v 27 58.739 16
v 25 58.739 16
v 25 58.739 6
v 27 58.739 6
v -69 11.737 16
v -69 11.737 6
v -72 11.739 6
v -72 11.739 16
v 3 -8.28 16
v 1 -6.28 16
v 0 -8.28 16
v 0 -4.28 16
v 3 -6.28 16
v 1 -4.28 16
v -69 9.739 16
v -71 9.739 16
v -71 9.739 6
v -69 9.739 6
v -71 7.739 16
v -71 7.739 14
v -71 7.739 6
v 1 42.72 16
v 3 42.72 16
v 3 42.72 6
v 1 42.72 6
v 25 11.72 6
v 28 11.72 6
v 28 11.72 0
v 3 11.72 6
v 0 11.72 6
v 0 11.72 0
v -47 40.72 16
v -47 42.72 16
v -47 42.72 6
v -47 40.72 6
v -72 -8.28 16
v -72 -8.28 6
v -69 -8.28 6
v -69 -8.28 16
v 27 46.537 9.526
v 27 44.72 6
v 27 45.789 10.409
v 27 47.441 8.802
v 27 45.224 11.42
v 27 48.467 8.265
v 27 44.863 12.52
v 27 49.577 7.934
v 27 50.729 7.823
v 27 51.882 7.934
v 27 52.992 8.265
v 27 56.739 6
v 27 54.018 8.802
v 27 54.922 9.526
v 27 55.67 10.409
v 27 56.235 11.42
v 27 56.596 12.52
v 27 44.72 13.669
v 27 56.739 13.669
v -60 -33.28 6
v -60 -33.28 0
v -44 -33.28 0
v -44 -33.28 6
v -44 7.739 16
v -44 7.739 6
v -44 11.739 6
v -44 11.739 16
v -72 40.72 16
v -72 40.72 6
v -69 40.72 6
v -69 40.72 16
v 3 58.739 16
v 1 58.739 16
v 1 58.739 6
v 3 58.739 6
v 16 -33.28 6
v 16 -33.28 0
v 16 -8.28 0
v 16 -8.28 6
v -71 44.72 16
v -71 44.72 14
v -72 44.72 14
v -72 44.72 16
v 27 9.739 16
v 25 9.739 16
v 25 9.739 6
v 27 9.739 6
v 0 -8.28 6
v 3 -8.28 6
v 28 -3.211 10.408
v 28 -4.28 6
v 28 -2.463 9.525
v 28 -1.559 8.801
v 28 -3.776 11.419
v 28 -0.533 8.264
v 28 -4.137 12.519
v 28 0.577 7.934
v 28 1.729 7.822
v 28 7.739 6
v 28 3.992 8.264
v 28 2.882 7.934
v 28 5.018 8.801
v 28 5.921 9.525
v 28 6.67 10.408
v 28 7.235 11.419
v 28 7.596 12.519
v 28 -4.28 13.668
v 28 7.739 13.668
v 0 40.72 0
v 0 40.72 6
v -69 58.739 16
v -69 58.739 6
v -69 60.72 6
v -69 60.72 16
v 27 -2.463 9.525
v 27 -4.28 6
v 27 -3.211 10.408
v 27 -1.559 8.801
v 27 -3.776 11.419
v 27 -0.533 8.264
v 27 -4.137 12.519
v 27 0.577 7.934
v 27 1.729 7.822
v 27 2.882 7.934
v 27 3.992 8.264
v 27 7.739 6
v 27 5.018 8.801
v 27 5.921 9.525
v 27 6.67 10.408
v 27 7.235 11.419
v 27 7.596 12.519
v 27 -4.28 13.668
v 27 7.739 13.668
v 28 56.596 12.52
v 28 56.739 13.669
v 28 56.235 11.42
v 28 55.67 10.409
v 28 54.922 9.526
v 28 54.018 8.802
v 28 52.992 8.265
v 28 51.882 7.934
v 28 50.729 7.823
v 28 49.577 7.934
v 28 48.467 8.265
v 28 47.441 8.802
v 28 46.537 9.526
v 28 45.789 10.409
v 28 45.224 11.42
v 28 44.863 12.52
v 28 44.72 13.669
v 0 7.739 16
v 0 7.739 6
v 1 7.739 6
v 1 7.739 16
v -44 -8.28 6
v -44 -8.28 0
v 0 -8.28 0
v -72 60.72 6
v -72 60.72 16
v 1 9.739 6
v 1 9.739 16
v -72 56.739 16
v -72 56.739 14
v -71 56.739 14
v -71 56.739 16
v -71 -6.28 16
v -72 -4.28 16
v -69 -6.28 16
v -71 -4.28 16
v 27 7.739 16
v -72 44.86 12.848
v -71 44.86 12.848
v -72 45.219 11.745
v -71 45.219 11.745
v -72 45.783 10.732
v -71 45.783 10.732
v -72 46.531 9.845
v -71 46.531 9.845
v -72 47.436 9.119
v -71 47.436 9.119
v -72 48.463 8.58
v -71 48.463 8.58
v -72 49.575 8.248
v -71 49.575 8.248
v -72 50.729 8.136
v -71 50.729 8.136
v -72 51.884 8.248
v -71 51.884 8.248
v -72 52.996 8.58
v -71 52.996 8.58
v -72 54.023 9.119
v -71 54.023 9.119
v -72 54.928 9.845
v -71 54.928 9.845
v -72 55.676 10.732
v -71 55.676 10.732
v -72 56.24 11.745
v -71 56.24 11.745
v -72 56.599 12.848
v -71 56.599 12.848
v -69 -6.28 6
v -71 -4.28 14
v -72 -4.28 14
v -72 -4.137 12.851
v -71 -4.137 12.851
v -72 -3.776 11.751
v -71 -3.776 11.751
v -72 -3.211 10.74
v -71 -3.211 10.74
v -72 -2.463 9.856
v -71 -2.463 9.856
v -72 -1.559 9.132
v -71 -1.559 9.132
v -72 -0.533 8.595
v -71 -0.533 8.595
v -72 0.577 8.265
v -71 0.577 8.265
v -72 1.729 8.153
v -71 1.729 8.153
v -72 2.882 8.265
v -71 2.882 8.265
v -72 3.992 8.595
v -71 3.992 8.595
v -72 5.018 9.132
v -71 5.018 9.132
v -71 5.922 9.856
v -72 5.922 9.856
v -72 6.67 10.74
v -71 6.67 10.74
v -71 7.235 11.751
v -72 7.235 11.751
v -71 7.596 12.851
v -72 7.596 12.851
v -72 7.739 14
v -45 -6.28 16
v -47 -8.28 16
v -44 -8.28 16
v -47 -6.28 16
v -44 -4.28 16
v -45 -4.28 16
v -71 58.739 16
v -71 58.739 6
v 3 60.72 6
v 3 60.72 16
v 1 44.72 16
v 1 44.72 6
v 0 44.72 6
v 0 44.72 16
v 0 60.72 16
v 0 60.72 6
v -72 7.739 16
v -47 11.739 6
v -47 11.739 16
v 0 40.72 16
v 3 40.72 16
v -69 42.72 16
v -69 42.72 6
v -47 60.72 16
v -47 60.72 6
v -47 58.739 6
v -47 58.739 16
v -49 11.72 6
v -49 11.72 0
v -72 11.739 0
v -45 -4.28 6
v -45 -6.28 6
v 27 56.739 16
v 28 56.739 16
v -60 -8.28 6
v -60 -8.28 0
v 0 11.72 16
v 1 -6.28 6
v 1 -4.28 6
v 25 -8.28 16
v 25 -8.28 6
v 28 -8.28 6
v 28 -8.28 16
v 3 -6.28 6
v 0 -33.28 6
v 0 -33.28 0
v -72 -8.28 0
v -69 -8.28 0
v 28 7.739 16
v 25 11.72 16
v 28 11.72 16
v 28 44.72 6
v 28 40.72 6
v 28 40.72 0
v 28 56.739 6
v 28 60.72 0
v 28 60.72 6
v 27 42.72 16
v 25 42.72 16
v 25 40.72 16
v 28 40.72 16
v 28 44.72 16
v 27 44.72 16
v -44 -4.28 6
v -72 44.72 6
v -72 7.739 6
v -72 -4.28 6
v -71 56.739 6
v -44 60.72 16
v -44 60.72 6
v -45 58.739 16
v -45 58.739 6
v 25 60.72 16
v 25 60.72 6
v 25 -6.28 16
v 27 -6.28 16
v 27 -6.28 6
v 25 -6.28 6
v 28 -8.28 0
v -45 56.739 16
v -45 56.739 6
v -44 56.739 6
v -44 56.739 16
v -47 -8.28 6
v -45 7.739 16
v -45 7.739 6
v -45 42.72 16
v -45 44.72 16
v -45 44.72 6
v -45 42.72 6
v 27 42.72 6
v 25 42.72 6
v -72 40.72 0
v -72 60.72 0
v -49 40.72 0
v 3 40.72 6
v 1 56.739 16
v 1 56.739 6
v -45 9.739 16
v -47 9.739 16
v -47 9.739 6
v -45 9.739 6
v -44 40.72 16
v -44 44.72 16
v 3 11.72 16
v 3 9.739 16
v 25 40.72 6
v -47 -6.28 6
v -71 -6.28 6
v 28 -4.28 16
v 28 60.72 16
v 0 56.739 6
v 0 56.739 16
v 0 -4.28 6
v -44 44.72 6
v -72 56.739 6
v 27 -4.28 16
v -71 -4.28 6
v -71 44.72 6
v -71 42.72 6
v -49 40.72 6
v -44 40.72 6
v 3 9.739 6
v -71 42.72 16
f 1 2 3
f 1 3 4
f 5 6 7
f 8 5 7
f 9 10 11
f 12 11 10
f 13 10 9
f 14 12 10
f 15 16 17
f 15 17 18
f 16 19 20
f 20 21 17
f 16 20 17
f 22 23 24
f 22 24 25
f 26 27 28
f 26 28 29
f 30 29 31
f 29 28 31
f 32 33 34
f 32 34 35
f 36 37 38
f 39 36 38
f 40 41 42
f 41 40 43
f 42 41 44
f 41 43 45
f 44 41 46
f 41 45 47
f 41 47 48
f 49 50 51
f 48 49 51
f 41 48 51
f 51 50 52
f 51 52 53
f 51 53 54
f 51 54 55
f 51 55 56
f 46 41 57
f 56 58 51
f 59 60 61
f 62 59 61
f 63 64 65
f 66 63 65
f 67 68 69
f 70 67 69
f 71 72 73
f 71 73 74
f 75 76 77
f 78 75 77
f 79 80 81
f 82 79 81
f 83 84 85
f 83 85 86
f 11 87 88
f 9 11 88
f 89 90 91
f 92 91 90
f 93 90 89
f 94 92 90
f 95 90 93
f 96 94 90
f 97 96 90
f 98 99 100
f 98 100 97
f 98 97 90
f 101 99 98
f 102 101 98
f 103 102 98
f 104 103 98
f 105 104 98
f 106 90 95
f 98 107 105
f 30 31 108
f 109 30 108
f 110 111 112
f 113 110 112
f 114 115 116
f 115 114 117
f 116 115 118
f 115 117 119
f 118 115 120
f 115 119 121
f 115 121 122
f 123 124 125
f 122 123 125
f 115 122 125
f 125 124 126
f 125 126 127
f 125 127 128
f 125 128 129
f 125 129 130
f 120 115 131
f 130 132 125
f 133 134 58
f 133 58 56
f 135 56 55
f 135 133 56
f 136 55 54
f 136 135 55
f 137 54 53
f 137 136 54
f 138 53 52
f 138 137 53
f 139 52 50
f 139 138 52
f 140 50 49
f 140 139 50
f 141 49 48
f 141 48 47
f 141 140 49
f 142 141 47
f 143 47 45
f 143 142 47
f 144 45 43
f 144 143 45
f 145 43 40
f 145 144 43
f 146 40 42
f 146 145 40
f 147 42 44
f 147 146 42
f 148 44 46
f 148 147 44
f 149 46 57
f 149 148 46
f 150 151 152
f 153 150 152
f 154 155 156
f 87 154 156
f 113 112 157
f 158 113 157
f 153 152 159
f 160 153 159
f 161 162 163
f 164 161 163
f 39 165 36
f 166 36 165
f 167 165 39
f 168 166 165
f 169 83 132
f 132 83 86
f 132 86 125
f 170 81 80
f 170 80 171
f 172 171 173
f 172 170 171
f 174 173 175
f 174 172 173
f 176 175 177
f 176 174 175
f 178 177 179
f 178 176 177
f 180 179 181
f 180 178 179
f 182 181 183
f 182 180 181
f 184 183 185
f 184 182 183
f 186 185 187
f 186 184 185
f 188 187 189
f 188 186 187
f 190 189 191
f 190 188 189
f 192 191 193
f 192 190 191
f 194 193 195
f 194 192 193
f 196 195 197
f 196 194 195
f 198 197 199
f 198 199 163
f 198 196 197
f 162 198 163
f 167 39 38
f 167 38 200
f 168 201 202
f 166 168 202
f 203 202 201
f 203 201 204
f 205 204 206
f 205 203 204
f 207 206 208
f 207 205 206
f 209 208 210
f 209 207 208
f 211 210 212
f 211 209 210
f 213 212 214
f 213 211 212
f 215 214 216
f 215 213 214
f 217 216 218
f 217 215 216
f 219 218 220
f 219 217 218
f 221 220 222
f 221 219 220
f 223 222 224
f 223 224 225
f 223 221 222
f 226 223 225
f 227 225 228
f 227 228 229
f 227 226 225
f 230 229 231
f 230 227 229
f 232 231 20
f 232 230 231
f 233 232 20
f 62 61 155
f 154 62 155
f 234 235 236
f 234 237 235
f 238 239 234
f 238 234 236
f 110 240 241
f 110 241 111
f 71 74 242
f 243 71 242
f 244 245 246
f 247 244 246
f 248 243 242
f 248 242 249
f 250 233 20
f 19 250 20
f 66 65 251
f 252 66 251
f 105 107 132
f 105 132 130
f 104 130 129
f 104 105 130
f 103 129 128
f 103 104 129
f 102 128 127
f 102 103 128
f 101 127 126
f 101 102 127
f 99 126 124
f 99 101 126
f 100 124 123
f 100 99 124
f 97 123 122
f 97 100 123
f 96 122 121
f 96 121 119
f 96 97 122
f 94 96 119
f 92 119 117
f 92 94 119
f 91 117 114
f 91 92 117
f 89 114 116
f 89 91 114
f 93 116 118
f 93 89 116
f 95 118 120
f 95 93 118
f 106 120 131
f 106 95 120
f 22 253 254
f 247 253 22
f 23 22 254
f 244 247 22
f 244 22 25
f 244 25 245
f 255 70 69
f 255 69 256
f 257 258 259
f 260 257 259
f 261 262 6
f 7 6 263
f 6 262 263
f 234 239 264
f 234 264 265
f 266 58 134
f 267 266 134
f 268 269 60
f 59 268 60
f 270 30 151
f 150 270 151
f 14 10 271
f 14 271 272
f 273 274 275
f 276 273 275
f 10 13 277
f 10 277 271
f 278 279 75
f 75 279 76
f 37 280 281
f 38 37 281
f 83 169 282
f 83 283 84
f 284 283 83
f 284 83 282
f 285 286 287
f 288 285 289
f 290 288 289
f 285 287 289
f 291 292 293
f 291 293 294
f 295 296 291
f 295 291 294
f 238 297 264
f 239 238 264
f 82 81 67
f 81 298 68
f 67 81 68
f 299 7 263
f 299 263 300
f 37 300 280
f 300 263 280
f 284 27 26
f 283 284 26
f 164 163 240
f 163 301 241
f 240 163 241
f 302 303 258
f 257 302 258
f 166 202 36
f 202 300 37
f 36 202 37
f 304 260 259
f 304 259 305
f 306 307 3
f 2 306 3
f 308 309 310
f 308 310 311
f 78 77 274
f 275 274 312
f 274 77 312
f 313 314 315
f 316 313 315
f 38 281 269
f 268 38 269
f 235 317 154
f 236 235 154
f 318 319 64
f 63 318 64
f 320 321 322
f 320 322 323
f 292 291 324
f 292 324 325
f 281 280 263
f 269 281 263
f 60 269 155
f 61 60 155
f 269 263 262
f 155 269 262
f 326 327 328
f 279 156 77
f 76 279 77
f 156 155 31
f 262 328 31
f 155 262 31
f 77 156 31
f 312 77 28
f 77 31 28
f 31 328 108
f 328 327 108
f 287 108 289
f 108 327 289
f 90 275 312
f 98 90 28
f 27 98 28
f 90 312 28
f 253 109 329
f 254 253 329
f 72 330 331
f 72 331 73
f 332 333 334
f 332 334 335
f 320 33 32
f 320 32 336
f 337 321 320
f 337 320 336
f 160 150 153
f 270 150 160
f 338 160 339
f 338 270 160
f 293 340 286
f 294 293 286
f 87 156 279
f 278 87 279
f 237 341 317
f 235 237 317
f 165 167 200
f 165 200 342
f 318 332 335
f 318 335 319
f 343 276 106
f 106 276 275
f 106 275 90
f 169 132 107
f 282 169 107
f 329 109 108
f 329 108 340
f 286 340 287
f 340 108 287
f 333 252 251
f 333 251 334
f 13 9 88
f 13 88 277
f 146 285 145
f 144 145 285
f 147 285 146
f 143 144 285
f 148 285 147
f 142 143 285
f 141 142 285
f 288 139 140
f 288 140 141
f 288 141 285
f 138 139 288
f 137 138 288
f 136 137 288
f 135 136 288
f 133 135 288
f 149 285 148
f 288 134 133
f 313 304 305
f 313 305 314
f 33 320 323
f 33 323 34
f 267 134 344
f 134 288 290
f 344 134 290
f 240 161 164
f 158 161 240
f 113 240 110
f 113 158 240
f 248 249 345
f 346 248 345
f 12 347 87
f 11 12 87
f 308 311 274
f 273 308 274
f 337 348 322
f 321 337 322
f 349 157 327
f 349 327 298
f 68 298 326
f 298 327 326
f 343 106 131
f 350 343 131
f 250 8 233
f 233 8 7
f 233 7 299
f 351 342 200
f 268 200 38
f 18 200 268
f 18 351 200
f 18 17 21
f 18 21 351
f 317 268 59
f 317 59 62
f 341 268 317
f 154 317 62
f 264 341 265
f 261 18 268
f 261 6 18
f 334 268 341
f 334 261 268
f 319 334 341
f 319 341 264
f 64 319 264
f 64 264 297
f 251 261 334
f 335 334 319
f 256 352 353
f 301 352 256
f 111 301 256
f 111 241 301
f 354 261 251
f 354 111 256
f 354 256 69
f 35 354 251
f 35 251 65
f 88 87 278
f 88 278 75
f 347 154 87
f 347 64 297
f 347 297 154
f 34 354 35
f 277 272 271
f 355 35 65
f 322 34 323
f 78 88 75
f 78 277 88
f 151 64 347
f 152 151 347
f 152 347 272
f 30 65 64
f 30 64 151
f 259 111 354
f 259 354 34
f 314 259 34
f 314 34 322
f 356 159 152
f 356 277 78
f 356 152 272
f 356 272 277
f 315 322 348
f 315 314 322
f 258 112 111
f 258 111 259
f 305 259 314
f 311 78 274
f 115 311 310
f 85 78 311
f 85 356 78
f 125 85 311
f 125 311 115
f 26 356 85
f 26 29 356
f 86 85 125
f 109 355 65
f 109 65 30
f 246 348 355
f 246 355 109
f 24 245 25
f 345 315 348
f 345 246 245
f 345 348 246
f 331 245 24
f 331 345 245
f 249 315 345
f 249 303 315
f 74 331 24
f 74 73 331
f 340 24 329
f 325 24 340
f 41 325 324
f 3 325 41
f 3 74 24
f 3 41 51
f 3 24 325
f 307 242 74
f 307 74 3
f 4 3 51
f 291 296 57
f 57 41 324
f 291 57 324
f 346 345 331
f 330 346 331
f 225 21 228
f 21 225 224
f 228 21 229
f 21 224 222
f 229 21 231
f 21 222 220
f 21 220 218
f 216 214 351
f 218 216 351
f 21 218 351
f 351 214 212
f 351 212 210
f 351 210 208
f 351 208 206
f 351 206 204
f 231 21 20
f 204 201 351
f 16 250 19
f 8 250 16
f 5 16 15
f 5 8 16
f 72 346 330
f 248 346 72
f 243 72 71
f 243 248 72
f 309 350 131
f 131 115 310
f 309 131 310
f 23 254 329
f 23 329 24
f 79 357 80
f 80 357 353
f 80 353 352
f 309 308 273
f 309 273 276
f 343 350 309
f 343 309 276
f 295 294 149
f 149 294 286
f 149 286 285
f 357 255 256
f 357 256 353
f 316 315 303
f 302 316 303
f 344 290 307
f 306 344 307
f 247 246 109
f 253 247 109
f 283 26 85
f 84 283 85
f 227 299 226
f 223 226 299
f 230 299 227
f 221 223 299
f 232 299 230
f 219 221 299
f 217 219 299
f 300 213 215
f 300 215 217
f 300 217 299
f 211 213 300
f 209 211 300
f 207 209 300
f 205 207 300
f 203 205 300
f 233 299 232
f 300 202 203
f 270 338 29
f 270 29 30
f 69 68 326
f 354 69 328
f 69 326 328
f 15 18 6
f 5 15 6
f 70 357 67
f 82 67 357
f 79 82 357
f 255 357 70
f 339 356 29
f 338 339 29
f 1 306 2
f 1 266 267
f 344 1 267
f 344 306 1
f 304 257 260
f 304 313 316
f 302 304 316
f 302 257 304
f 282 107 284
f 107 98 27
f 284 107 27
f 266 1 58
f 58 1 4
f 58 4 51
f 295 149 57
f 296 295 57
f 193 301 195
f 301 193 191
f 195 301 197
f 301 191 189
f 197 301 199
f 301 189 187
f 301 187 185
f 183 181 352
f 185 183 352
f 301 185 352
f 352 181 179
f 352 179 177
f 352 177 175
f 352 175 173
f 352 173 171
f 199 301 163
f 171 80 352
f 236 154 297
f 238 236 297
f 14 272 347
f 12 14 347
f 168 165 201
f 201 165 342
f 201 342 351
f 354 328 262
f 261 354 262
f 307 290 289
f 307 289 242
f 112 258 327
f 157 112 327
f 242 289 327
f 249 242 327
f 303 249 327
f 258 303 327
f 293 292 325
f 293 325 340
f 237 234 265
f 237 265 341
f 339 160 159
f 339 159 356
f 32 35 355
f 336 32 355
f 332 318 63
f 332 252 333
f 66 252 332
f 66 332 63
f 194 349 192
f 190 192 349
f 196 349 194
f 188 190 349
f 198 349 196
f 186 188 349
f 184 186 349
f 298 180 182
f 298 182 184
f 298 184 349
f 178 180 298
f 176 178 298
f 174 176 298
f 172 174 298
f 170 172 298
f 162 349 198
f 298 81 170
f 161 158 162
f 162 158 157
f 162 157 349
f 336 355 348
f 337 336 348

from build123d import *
from build123d import SkipClean  # not in build123d's __all__

# Parameters (mm, degrees)
F1_DEPTH  = 6
F3_DEPTH  = 10
F5_DEPTH  = 1
F7_DEPTH  = 1
F9_DEPTH  = 1
F10_DEPTH = 1
F13_DEPTH = 1


# Not quite as in the source:
# - ends of sketch curves that miss each other by under 0.0002 mm in the source are joined


with BuildPart() as f1:
    # F0 (on Top) → F1 (new body)
    with BuildSketch(Plane.XY):
        Polygon((-60, -8.2803227458), (-60, -33.2803227458), (-44, -33.2803227458), (-44, -8.2803227458), (0, -8.2803227458), (0, -33.2803227458), (16, -33.2803227458), (16, -8.2803227458), (28, -8.2803227458), (28, 11.7196772542), (0, 11.7196772542), (0, 40.7196772542), (28, 40.7196772542), (28, 60.7196772542), (-72, 60.7196772542), (-72, 40.7196772542), (-49, 40.7196772542), (-49, 11.7196772542), (-72, 11.7391310632), (-72, 11.693589665), (-72, 7.693589665), (-72, -4.280322887), (-72, -8.280322887), (-69, -8.2803227458), align=None)
    extrude(amount=F1_DEPTH)

    # F2 (on face) → F3 (join)
    with BuildSketch(Plane.XY.offset(6)):
        Polygon((-72, 60.7196772542), (-72, 56.7391310632), (-71, 56.7391310632), (-71, 58.7391310632), (-69, 58.7391310632), (-69, 60.7196772542), align=None)
        Polygon((-72, 40.7196773953), (-69, 40.7196773953), (-69, 42.7196773953), (-71, 42.7196773953), (-71, 44.7196773953), (-72, 44.7196773953), align=None)
        Polygon((-45, 42.7196773953), (-47, 42.7196773953), (-47, 40.7196773953), (-44, 40.7196773953), (-44, 44.7196773953), (-45, 44.7196773953), align=None)
        Polygon((-44, 60.7196772542), (-47, 60.7196772542), (-47, 58.7391310632), (-45, 58.7391310632), (-45, 56.7391310632), (-44, 56.7391310632), align=None)
        Polygon((28, 60.7196772542), (25, 60.7196772542), (25, 58.7391310632), (27, 58.7391310632), (27, 56.7391310632), (28, 56.7391310632), align=None)
        Polygon((25, 42.7196773953), (25, 40.7196773953), (28, 40.7196773953), (28, 44.7196773953), (27, 44.7196773953), (27, 42.7196773953), align=None)
        Polygon((0, 44.7196773953), (0, 40.7196772542), (3, 40.7196773953), (3, 42.7196773953), (1, 42.7196773953), (1, 44.7196773953), align=None)
        Polygon((3, 60.7196772542), (0, 60.7196772542), (0, 56.7391310632), (1, 56.7391310632), (1, 58.7391310632), (3, 58.7391310632), align=None)
        Polygon((27, 7.7391309221), (28, 7.7391309221), (28, 11.7196772542), (25, 11.7196772542), (25, 9.7391309221), (27, 9.7391309221), align=None)
        Polygon((25, -6.2803227458), (25, -8.2803227458), (28, -8.2803227458), (28, -4.2803227458), (27, -4.2803227458), (27, -6.2803227458), align=None)
        Polygon((0, -4.2803227458), (0, -8.280322887), (3, -8.2803227458), (3, -6.2803227458), (1, -6.2803227458), (1, -4.2803227458), align=None)
        Polygon((3, 9.7391309221), (3, 11.7196772542), (0, 11.7196772542), (0, 7.7391309221), (1, 7.7391309221), (1, 9.7391309221), align=None)
        Polygon((-45, 7.7391309221), (-44, 7.7391309221), (-44, 11.7391310632), (-47, 11.7391309221), (-47, 9.7391309221), (-45, 9.7391309221), align=None)
        Polygon((-47, -8.2803227458), (-44, -8.2803227458), (-44, -4.2803227458), (-45, -4.2803227458), (-45, -6.2803227458), (-47, -6.2803227458), align=None)
        Polygon((-72, -4.2803227458), (-72, -8.280322887), (-69, -8.2803227458), (-69, -6.2803227458), (-71, -6.2803227458), (-71, -4.2803227458), align=None)
        Polygon((-72, 11.7391310632), (-72, 7.7391309221), (-71, 7.7391309221), (-71, 9.7391309221), (-69, 9.7391309221), (-69, 11.7365936099), align=None)
    with SkipClean():  # cleaning this boolean's faces spoils the solid; the shape is the same uncleaned
        extrude(amount=F3_DEPTH)

    # F4 (on face) → F5 (join)
    with BuildSketch(Plane.YZ.offset(28)):
        with BuildLine():
            ThreePointArc((7.7391309221, 13.6681435205), (1.7294040881, 7.8220547277), (-4.2803227458, 13.6681435205))
            Line((-4.2803227458, 13.6681435205), (-4.2803227458, 6))
            Line((-4.2803227458, 6), (7.7391309221, 6))
            Line((7.7391309221, 6), (7.7391309221, 13.6681435205))
        make_face()
    with SkipClean():  # cleaning this boolean's faces spoils the solid; the shape is the same uncleaned
        extrude(amount=-F5_DEPTH)

    # F6 (on face) → F7 (join)
    with BuildSketch(Plane.YZ.offset(28)):
        with BuildLine():
            ThreePointArc((56.7391310632, 13.6693800888), (50.7294042293, 7.8226900444), (44.7196773953, 13.6693800888))
            Line((44.7196773953, 13.6693800888), (44.7196773953, 6))
            Line((44.7196773953, 6), (56.7391310632, 6))
            Line((56.7391310632, 6), (56.7391310632, 13.6693800888))
        make_face()
    with SkipClean():  # cleaning this boolean's faces spoils the solid; the shape is the same uncleaned
        extrude(amount=-F7_DEPTH)

    # F8 (on face) → F9 (join)
    with BuildSketch(Plane(origin=(-72, 0, 0), x_dir=(0, -1, 0), z_dir=(-1, 0, 0))):
        with BuildLine():
            ThreePointArc((-44.7196773953, 14), (-50.7294042293, 8.1363701718), (-56.7391310632, 14))
            Line((-56.7391310632, 14), (-56.7391310632, 6))
            Line((-56.7391310632, 6), (-44.7196773953, 6))
            Line((-44.7196773953, 6), (-44.7196773953, 14))
        make_face()
    with SkipClean():  # cleaning this boolean's faces spoils the solid; the shape is the same uncleaned
        extrude(amount=-F9_DEPTH)

    # F12 (on face) → F13 (join)
    with BuildSketch(Plane(origin=(-72, 0, 0), x_dir=(0, -1, 0), z_dir=(-1, 0, 0))):
        with BuildLine():
            ThreePointArc((4.2803227458, 14), (-1.7294040881, 8.1533099556), (-7.7391309221, 14))
            Line((-7.7391309221, 14), (-7.7391309221, 6))
            Line((-7.7391309221, 6), (4.2803227458, 6))
            Line((4.2803227458, 6), (4.2803227458, 14))
        make_face()
    with SkipClean():  # cleaning this boolean's faces spoils the solid; the shape is the same uncleaned
        extrude(amount=-F13_DEPTH)


with BuildPart() as f10:
    # F8 (on face) → F10 (new body)
    with BuildSketch(Plane(origin=(-72, 0, 0), x_dir=(0, -1, 0), z_dir=(-1, 0, 0))):
        with BuildLine():
            ThreePointArc((4.282593064, 13.8288382557), (-1.649666924, 7.8232188447), (-7.7391309221, 13.6693800888))
            Line((-7.7391309221, 13.6693800888), (-7.7391309221, 5.9489118867))
            Line((-7.7391309221, 5.9489118867), (4.3871137314, 5.9489118867))
            Line((4.3871137314, 5.9489118867), (4.282593064, 13.8288382557))
        make_face()
    extrude(amount=-F10_DEPTH)


solid = f1.part
